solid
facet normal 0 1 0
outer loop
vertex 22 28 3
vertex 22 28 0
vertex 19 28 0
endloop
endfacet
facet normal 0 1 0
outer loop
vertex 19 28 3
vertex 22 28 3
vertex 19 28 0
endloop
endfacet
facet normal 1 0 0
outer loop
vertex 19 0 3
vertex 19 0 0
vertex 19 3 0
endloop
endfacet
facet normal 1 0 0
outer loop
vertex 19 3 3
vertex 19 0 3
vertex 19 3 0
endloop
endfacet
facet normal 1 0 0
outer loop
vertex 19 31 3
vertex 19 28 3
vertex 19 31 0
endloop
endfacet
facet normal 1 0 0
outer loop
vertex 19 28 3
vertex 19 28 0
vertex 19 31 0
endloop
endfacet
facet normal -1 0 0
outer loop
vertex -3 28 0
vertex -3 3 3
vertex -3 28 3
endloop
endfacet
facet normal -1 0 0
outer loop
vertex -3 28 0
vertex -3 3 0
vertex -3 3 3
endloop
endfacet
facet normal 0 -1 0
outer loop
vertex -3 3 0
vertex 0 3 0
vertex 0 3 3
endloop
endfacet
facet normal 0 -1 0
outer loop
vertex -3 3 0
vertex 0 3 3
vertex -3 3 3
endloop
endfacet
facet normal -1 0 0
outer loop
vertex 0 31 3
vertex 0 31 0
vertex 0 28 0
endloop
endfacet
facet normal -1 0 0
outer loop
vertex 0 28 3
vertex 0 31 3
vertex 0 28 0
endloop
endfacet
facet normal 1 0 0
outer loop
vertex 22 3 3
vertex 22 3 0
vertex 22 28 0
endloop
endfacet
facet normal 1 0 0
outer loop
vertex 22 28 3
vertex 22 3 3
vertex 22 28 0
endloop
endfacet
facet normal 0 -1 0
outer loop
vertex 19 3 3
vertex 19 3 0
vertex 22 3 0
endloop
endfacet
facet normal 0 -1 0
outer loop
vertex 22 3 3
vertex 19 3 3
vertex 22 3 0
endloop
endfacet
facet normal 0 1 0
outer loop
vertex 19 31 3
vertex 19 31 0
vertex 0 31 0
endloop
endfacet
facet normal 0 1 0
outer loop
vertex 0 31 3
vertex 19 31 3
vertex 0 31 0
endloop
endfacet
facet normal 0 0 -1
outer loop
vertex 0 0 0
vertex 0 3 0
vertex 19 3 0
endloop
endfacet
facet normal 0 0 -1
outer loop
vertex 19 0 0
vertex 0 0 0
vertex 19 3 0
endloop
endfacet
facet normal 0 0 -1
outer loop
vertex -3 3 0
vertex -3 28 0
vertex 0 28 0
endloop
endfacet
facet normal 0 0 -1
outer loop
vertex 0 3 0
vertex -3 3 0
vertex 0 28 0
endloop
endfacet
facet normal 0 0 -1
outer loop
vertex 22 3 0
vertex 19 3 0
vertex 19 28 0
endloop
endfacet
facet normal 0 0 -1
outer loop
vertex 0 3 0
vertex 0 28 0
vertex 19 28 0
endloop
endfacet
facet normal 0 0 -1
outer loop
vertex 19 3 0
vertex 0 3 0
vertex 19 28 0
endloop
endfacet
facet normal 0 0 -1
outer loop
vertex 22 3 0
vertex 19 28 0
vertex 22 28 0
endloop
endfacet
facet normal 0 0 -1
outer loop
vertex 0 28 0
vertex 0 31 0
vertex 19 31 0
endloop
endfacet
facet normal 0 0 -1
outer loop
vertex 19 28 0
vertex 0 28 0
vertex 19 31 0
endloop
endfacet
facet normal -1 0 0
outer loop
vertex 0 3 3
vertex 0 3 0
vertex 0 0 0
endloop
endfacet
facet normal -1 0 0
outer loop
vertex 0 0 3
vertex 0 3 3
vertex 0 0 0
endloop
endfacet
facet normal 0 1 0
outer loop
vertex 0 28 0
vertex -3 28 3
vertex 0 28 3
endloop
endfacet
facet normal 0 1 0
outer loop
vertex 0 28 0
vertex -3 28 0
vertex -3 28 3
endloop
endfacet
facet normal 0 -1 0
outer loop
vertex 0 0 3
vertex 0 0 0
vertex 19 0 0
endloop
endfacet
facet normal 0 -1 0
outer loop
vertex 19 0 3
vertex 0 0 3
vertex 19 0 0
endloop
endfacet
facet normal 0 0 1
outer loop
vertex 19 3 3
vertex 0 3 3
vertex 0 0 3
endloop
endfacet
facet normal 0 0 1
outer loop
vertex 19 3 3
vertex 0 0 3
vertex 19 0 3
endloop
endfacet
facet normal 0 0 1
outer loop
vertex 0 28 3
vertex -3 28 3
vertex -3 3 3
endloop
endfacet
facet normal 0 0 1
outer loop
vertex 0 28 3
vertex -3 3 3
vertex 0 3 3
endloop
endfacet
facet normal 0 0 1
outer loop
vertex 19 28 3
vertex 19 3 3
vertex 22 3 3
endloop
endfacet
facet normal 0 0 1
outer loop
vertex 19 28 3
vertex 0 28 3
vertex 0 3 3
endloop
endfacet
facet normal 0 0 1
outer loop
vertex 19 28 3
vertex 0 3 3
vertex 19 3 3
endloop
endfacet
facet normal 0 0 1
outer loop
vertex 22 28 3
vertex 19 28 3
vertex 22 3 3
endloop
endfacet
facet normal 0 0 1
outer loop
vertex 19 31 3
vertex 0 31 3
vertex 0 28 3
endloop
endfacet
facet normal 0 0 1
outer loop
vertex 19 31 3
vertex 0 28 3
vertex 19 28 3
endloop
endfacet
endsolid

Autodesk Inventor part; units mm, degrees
ref_plane "YZ Plane" through (0, 0, 0) normal (1, 0, 0) x (0, 1, 0)
ref_plane "XZ Plane" through (0, 0, 0) normal (0, 1, 0) x (-1, 0, 0)
ref_plane "XY Plane" through (0, 0, 0) normal (0, 0, 1) x (1, 0, 0)
sketch "Sketch1" plane through (0, 0, 0) normal (0, 0, 1) x (1, 0, 0)
  line L0 (0, 0) -> (19, 0)
  line L1 (19, 0) -> (19, 31)
  line L2 (19, 31) -> (0, 31)
  line L3 (0, 31) -> (0, 0)
  line L4 (-3, 28) -> (0, 28)
  line L5 (0, 28) -> (0, 3)
  line L6 (0, 3) -> (-3, 3)
  line L7 (-3, 3) -> (-3, 28)
  line L8 (-3, 28) -> (0, 3) construction
  line L9 (0, 28) -> (-3, 3) construction
  line L10 (22, 28) -> (19, 28)
  line L11 (19, 28) -> (19, 3)
  line L12 (19, 3) -> (22, 3)
  line L13 (22, 3) -> (22, 28)
  line L14 (22, 28) -> (19, 3) construction
  line L15 (19, 28) -> (22, 3) construction
  point P0 (-1.5, 15.5)
  point P1 (20.5, 15.5)
  point P2 (0, 15.5)
  point P3 (0, 15.5)
  point P4 (0, 28)
  dimension "d0" = 19
  dimension "d1" = 31
  dimension "d2" = 3
  dimension "d3" = 3
  dimension "d4" = 25
extrude "Extrusion1" add sketch "Sketch1" along normal blind 3
properties part number "Frontrail"
